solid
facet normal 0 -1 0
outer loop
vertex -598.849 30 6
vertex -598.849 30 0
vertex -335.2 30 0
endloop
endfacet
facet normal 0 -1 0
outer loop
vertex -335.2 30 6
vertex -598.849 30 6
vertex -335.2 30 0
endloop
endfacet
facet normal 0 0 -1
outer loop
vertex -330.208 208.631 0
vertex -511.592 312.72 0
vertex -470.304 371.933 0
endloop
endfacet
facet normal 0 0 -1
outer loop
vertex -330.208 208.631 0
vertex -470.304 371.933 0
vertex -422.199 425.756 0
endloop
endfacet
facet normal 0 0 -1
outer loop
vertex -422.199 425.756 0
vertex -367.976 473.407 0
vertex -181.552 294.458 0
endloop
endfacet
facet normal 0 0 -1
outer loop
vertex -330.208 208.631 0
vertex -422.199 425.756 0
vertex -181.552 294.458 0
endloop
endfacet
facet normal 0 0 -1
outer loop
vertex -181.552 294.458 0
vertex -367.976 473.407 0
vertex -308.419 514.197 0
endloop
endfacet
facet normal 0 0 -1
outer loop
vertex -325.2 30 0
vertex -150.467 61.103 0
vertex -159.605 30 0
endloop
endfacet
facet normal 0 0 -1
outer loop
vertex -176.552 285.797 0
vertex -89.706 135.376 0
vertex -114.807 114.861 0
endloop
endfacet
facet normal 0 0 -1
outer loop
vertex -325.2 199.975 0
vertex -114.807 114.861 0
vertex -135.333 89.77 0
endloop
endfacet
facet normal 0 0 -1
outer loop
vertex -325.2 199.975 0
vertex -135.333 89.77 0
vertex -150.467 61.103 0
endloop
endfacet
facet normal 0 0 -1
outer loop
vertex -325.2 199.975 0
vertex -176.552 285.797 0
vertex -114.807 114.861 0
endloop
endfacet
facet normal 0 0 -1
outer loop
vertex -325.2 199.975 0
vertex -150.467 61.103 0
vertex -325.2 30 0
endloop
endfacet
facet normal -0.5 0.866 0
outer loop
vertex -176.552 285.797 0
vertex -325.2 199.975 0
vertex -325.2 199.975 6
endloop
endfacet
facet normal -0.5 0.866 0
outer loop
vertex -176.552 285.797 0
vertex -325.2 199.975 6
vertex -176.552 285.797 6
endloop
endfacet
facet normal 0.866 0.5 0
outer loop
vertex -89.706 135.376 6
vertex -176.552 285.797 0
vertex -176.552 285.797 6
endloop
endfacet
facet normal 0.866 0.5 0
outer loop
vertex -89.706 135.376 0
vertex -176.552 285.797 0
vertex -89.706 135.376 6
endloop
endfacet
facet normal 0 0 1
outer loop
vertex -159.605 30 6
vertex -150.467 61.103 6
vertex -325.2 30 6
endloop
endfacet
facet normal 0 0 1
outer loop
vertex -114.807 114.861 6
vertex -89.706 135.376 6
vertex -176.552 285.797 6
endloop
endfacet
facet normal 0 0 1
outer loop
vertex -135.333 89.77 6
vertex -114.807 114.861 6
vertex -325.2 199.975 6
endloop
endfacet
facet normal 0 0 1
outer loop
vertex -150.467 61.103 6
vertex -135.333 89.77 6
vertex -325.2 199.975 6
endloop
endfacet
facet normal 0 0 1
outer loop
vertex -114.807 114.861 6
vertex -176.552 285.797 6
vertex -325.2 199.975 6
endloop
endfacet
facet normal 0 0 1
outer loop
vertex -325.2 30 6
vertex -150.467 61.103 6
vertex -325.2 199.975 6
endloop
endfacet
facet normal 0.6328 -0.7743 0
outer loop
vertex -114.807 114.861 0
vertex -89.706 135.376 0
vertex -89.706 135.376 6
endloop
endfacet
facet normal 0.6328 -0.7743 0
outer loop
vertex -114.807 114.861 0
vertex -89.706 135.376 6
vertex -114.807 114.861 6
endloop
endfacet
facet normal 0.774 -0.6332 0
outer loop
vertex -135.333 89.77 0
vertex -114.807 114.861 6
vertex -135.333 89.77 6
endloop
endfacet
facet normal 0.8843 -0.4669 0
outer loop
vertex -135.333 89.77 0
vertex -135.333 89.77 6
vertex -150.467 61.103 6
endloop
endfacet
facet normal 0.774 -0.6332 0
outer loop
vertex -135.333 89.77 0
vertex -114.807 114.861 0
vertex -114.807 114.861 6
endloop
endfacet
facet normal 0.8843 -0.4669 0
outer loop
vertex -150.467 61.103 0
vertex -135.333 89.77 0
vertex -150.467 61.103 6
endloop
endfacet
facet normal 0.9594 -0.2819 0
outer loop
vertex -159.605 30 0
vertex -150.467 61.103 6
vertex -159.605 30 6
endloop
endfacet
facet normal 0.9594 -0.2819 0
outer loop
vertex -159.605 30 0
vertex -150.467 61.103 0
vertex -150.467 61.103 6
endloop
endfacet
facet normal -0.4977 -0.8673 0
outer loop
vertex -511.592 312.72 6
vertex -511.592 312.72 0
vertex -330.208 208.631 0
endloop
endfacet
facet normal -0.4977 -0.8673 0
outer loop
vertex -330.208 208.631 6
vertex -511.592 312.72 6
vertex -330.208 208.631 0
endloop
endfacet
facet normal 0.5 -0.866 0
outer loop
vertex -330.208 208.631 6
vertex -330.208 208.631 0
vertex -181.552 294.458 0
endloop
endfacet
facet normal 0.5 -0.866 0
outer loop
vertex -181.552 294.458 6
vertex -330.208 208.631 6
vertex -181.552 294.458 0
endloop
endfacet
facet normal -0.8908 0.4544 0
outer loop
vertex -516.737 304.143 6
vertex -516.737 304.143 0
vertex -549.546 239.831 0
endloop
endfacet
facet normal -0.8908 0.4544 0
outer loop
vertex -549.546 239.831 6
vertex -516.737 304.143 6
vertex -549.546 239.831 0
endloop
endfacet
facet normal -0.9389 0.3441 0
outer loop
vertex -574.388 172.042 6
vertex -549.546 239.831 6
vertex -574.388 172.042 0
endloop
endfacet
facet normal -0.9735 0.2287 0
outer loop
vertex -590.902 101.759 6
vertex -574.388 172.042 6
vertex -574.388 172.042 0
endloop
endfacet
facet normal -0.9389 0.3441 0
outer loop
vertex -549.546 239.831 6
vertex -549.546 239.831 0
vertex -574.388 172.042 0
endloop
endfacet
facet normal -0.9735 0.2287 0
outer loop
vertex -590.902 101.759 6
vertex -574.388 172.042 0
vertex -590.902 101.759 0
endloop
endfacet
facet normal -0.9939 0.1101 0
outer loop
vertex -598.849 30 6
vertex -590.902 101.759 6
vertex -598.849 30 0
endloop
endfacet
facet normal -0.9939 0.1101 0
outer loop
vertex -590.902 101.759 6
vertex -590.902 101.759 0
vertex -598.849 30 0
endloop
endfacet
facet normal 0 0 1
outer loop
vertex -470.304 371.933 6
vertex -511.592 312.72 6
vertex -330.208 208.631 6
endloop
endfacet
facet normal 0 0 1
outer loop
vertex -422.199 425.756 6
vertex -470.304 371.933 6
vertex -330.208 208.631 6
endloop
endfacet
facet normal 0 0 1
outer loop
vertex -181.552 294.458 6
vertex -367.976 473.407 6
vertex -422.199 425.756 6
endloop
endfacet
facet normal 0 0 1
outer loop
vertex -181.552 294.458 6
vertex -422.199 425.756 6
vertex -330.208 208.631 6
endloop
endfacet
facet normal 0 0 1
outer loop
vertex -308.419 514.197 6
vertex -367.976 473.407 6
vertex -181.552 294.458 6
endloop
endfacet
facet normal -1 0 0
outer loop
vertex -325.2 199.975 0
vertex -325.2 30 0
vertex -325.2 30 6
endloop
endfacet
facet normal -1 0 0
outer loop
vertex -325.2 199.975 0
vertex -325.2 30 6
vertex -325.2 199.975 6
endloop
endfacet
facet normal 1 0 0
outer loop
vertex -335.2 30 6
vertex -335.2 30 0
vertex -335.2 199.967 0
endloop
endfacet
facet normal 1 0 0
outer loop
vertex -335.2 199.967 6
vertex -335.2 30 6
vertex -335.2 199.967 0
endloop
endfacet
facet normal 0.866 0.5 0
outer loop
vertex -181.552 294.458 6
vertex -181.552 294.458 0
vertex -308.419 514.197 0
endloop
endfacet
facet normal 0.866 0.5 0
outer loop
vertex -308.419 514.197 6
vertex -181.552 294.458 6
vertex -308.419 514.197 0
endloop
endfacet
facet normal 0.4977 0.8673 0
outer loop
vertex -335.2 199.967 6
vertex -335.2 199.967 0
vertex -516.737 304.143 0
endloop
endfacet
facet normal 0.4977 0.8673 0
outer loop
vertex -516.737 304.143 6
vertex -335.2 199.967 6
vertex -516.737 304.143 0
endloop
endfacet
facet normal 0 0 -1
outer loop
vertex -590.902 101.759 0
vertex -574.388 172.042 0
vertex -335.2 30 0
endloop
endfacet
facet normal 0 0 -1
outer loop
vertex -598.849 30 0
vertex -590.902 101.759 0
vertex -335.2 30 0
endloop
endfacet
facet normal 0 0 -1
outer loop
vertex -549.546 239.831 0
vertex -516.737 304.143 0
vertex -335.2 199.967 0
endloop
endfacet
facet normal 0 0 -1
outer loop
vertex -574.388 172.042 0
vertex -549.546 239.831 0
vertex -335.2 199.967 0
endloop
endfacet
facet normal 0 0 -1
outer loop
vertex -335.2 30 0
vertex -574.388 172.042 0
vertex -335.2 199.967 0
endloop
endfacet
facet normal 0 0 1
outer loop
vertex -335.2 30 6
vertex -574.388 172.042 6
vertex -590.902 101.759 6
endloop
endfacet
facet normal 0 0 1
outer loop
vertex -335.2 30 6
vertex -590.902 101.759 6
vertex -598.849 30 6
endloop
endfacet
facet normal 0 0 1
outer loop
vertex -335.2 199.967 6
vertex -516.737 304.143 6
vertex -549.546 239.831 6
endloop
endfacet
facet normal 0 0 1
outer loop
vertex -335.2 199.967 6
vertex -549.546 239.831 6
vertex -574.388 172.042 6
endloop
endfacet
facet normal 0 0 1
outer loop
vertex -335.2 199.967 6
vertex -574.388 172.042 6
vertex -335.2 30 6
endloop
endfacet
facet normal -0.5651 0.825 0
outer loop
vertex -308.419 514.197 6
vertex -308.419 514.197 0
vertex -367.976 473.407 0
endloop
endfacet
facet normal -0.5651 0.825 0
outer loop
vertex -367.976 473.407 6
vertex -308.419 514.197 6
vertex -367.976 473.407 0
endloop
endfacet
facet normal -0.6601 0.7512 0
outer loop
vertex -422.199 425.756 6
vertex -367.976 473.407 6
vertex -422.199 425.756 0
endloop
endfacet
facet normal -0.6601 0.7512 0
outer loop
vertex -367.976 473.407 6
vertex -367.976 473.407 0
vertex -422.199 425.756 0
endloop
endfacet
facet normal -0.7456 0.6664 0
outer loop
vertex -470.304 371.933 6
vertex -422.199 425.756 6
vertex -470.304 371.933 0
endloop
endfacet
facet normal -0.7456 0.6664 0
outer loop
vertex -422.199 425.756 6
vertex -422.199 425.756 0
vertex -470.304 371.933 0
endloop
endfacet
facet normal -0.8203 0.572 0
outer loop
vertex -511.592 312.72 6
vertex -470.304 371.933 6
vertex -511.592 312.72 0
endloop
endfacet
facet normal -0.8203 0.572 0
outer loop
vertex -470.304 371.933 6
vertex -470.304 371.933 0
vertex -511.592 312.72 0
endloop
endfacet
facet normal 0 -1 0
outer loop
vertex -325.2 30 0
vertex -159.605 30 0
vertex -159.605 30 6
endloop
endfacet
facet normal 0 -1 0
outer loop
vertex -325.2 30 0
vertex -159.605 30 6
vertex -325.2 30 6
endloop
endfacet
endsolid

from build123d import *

# Parameters (mm, degrees)
BOSS_EXTRUDE2_DEPTH   = 6
BOSS_EXTRUDE2_2_DEPTH = 6
BOSS_EXTRUDE2_3_DEPTH = 6


with BuildPart() as part:
    # Sketch1 → Boss-Extrude2 (new body)
    with BuildSketch(Plane.XY):
        with BuildLine():
            Line((-335.2, 199.966608393), (-516.736885171, 304.143307511))
            ThreePointArc((-516.736885171, 304.143307511), (-574.388040835, 172.042258023), (-598.849029389, 30))
            Line((-598.849029389, 30), (-335.2, 30))
            Line((-335.2, 30), (-335.2, 199.966608393))
        make_face()
    extrude(amount=BOSS_EXTRUDE2_DEPTH)


with BuildPart() as body_2:
    # Sketch1 → Boss-Extrude2 2 (new body)
    with BuildSketch(Plane.XY):
        with BuildLine():
            Line((-181.552122678, 294.457500701), (-308.418556675, 514.196610158))
            ThreePointArc((-308.418556675, 514.196610158), (-422.199493266, 425.755502473), (-511.591783696, 312.720333293))
            Line((-511.591783696, 312.720333293), (-330.207563047, 208.631242188))
            Line((-330.207563047, 208.631242188), (-181.552122678, 294.457500701))
        make_face()
    extrude(amount=BOSS_EXTRUDE2_2_DEPTH)


with BuildPart() as body_3:
    # Sketch1 → Boss-Extrude2 3 (new body)
    with BuildSketch(Plane.XY):
        with BuildLine():
            ThreePointArc((-89.706166951, 135.375638912), (-135.333005446, 89.770471966), (-159.605012453, 30))
            Line((-159.605012453, 30), (-325.2, 30))
            Line((-325.2, 30), (-325.2, 199.975354677))
            Line((-325.2, 199.975354677), (-176.552122678, 285.797246663))
            Line((-176.552122678, 285.797246663), (-89.706166951, 135.375638912))
        make_face()
    extrude(amount=BOSS_EXTRUDE2_3_DEPTH)


solid = Compound([part.part, body_2.part, body_3.part])
